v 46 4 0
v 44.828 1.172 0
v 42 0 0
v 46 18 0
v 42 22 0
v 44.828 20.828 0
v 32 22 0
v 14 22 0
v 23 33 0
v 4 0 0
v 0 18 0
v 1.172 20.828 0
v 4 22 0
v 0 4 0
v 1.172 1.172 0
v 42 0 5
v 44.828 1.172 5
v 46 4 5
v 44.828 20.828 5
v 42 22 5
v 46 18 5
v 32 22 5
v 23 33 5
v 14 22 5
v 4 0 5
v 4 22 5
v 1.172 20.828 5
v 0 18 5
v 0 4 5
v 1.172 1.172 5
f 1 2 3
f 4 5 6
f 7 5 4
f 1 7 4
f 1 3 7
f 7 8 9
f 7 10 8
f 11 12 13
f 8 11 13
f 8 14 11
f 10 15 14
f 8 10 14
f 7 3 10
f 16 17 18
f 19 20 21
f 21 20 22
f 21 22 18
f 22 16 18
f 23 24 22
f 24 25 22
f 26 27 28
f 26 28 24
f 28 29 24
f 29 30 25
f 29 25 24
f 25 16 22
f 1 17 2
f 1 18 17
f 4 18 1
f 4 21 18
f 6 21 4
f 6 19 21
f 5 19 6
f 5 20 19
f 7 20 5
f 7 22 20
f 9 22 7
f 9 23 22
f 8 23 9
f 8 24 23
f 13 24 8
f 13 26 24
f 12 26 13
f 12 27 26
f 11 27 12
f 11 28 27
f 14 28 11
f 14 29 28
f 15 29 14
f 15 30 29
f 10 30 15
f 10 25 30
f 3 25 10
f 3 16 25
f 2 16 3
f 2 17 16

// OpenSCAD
$fn = 32;

// ----------------------------------------------------------------------
// Ratchet pawl: 46 x 22 mm body, beak 11 mm сверху
// ----------------------------------------------------------------------

// --- parameters (mm) ---
profile_height = 5;       // extrusion height
profile_points = 15;      // points of the closed outline

profile = [[0, 4], [1.172, 1.172], [4, 0], [42, 0], [44.828, 1.172], [46, 4], [46, 18], [44.828, 20.828], [42, 22], [32, 22], [23, 33], [14, 22], [4, 22], [1.172, 20.828], [0, 18]];  // single closed polygon, 15 points, counter clockwise

// --- the one profile operation ---
linear_extrude(height = profile_height) polygon(points = profile);
